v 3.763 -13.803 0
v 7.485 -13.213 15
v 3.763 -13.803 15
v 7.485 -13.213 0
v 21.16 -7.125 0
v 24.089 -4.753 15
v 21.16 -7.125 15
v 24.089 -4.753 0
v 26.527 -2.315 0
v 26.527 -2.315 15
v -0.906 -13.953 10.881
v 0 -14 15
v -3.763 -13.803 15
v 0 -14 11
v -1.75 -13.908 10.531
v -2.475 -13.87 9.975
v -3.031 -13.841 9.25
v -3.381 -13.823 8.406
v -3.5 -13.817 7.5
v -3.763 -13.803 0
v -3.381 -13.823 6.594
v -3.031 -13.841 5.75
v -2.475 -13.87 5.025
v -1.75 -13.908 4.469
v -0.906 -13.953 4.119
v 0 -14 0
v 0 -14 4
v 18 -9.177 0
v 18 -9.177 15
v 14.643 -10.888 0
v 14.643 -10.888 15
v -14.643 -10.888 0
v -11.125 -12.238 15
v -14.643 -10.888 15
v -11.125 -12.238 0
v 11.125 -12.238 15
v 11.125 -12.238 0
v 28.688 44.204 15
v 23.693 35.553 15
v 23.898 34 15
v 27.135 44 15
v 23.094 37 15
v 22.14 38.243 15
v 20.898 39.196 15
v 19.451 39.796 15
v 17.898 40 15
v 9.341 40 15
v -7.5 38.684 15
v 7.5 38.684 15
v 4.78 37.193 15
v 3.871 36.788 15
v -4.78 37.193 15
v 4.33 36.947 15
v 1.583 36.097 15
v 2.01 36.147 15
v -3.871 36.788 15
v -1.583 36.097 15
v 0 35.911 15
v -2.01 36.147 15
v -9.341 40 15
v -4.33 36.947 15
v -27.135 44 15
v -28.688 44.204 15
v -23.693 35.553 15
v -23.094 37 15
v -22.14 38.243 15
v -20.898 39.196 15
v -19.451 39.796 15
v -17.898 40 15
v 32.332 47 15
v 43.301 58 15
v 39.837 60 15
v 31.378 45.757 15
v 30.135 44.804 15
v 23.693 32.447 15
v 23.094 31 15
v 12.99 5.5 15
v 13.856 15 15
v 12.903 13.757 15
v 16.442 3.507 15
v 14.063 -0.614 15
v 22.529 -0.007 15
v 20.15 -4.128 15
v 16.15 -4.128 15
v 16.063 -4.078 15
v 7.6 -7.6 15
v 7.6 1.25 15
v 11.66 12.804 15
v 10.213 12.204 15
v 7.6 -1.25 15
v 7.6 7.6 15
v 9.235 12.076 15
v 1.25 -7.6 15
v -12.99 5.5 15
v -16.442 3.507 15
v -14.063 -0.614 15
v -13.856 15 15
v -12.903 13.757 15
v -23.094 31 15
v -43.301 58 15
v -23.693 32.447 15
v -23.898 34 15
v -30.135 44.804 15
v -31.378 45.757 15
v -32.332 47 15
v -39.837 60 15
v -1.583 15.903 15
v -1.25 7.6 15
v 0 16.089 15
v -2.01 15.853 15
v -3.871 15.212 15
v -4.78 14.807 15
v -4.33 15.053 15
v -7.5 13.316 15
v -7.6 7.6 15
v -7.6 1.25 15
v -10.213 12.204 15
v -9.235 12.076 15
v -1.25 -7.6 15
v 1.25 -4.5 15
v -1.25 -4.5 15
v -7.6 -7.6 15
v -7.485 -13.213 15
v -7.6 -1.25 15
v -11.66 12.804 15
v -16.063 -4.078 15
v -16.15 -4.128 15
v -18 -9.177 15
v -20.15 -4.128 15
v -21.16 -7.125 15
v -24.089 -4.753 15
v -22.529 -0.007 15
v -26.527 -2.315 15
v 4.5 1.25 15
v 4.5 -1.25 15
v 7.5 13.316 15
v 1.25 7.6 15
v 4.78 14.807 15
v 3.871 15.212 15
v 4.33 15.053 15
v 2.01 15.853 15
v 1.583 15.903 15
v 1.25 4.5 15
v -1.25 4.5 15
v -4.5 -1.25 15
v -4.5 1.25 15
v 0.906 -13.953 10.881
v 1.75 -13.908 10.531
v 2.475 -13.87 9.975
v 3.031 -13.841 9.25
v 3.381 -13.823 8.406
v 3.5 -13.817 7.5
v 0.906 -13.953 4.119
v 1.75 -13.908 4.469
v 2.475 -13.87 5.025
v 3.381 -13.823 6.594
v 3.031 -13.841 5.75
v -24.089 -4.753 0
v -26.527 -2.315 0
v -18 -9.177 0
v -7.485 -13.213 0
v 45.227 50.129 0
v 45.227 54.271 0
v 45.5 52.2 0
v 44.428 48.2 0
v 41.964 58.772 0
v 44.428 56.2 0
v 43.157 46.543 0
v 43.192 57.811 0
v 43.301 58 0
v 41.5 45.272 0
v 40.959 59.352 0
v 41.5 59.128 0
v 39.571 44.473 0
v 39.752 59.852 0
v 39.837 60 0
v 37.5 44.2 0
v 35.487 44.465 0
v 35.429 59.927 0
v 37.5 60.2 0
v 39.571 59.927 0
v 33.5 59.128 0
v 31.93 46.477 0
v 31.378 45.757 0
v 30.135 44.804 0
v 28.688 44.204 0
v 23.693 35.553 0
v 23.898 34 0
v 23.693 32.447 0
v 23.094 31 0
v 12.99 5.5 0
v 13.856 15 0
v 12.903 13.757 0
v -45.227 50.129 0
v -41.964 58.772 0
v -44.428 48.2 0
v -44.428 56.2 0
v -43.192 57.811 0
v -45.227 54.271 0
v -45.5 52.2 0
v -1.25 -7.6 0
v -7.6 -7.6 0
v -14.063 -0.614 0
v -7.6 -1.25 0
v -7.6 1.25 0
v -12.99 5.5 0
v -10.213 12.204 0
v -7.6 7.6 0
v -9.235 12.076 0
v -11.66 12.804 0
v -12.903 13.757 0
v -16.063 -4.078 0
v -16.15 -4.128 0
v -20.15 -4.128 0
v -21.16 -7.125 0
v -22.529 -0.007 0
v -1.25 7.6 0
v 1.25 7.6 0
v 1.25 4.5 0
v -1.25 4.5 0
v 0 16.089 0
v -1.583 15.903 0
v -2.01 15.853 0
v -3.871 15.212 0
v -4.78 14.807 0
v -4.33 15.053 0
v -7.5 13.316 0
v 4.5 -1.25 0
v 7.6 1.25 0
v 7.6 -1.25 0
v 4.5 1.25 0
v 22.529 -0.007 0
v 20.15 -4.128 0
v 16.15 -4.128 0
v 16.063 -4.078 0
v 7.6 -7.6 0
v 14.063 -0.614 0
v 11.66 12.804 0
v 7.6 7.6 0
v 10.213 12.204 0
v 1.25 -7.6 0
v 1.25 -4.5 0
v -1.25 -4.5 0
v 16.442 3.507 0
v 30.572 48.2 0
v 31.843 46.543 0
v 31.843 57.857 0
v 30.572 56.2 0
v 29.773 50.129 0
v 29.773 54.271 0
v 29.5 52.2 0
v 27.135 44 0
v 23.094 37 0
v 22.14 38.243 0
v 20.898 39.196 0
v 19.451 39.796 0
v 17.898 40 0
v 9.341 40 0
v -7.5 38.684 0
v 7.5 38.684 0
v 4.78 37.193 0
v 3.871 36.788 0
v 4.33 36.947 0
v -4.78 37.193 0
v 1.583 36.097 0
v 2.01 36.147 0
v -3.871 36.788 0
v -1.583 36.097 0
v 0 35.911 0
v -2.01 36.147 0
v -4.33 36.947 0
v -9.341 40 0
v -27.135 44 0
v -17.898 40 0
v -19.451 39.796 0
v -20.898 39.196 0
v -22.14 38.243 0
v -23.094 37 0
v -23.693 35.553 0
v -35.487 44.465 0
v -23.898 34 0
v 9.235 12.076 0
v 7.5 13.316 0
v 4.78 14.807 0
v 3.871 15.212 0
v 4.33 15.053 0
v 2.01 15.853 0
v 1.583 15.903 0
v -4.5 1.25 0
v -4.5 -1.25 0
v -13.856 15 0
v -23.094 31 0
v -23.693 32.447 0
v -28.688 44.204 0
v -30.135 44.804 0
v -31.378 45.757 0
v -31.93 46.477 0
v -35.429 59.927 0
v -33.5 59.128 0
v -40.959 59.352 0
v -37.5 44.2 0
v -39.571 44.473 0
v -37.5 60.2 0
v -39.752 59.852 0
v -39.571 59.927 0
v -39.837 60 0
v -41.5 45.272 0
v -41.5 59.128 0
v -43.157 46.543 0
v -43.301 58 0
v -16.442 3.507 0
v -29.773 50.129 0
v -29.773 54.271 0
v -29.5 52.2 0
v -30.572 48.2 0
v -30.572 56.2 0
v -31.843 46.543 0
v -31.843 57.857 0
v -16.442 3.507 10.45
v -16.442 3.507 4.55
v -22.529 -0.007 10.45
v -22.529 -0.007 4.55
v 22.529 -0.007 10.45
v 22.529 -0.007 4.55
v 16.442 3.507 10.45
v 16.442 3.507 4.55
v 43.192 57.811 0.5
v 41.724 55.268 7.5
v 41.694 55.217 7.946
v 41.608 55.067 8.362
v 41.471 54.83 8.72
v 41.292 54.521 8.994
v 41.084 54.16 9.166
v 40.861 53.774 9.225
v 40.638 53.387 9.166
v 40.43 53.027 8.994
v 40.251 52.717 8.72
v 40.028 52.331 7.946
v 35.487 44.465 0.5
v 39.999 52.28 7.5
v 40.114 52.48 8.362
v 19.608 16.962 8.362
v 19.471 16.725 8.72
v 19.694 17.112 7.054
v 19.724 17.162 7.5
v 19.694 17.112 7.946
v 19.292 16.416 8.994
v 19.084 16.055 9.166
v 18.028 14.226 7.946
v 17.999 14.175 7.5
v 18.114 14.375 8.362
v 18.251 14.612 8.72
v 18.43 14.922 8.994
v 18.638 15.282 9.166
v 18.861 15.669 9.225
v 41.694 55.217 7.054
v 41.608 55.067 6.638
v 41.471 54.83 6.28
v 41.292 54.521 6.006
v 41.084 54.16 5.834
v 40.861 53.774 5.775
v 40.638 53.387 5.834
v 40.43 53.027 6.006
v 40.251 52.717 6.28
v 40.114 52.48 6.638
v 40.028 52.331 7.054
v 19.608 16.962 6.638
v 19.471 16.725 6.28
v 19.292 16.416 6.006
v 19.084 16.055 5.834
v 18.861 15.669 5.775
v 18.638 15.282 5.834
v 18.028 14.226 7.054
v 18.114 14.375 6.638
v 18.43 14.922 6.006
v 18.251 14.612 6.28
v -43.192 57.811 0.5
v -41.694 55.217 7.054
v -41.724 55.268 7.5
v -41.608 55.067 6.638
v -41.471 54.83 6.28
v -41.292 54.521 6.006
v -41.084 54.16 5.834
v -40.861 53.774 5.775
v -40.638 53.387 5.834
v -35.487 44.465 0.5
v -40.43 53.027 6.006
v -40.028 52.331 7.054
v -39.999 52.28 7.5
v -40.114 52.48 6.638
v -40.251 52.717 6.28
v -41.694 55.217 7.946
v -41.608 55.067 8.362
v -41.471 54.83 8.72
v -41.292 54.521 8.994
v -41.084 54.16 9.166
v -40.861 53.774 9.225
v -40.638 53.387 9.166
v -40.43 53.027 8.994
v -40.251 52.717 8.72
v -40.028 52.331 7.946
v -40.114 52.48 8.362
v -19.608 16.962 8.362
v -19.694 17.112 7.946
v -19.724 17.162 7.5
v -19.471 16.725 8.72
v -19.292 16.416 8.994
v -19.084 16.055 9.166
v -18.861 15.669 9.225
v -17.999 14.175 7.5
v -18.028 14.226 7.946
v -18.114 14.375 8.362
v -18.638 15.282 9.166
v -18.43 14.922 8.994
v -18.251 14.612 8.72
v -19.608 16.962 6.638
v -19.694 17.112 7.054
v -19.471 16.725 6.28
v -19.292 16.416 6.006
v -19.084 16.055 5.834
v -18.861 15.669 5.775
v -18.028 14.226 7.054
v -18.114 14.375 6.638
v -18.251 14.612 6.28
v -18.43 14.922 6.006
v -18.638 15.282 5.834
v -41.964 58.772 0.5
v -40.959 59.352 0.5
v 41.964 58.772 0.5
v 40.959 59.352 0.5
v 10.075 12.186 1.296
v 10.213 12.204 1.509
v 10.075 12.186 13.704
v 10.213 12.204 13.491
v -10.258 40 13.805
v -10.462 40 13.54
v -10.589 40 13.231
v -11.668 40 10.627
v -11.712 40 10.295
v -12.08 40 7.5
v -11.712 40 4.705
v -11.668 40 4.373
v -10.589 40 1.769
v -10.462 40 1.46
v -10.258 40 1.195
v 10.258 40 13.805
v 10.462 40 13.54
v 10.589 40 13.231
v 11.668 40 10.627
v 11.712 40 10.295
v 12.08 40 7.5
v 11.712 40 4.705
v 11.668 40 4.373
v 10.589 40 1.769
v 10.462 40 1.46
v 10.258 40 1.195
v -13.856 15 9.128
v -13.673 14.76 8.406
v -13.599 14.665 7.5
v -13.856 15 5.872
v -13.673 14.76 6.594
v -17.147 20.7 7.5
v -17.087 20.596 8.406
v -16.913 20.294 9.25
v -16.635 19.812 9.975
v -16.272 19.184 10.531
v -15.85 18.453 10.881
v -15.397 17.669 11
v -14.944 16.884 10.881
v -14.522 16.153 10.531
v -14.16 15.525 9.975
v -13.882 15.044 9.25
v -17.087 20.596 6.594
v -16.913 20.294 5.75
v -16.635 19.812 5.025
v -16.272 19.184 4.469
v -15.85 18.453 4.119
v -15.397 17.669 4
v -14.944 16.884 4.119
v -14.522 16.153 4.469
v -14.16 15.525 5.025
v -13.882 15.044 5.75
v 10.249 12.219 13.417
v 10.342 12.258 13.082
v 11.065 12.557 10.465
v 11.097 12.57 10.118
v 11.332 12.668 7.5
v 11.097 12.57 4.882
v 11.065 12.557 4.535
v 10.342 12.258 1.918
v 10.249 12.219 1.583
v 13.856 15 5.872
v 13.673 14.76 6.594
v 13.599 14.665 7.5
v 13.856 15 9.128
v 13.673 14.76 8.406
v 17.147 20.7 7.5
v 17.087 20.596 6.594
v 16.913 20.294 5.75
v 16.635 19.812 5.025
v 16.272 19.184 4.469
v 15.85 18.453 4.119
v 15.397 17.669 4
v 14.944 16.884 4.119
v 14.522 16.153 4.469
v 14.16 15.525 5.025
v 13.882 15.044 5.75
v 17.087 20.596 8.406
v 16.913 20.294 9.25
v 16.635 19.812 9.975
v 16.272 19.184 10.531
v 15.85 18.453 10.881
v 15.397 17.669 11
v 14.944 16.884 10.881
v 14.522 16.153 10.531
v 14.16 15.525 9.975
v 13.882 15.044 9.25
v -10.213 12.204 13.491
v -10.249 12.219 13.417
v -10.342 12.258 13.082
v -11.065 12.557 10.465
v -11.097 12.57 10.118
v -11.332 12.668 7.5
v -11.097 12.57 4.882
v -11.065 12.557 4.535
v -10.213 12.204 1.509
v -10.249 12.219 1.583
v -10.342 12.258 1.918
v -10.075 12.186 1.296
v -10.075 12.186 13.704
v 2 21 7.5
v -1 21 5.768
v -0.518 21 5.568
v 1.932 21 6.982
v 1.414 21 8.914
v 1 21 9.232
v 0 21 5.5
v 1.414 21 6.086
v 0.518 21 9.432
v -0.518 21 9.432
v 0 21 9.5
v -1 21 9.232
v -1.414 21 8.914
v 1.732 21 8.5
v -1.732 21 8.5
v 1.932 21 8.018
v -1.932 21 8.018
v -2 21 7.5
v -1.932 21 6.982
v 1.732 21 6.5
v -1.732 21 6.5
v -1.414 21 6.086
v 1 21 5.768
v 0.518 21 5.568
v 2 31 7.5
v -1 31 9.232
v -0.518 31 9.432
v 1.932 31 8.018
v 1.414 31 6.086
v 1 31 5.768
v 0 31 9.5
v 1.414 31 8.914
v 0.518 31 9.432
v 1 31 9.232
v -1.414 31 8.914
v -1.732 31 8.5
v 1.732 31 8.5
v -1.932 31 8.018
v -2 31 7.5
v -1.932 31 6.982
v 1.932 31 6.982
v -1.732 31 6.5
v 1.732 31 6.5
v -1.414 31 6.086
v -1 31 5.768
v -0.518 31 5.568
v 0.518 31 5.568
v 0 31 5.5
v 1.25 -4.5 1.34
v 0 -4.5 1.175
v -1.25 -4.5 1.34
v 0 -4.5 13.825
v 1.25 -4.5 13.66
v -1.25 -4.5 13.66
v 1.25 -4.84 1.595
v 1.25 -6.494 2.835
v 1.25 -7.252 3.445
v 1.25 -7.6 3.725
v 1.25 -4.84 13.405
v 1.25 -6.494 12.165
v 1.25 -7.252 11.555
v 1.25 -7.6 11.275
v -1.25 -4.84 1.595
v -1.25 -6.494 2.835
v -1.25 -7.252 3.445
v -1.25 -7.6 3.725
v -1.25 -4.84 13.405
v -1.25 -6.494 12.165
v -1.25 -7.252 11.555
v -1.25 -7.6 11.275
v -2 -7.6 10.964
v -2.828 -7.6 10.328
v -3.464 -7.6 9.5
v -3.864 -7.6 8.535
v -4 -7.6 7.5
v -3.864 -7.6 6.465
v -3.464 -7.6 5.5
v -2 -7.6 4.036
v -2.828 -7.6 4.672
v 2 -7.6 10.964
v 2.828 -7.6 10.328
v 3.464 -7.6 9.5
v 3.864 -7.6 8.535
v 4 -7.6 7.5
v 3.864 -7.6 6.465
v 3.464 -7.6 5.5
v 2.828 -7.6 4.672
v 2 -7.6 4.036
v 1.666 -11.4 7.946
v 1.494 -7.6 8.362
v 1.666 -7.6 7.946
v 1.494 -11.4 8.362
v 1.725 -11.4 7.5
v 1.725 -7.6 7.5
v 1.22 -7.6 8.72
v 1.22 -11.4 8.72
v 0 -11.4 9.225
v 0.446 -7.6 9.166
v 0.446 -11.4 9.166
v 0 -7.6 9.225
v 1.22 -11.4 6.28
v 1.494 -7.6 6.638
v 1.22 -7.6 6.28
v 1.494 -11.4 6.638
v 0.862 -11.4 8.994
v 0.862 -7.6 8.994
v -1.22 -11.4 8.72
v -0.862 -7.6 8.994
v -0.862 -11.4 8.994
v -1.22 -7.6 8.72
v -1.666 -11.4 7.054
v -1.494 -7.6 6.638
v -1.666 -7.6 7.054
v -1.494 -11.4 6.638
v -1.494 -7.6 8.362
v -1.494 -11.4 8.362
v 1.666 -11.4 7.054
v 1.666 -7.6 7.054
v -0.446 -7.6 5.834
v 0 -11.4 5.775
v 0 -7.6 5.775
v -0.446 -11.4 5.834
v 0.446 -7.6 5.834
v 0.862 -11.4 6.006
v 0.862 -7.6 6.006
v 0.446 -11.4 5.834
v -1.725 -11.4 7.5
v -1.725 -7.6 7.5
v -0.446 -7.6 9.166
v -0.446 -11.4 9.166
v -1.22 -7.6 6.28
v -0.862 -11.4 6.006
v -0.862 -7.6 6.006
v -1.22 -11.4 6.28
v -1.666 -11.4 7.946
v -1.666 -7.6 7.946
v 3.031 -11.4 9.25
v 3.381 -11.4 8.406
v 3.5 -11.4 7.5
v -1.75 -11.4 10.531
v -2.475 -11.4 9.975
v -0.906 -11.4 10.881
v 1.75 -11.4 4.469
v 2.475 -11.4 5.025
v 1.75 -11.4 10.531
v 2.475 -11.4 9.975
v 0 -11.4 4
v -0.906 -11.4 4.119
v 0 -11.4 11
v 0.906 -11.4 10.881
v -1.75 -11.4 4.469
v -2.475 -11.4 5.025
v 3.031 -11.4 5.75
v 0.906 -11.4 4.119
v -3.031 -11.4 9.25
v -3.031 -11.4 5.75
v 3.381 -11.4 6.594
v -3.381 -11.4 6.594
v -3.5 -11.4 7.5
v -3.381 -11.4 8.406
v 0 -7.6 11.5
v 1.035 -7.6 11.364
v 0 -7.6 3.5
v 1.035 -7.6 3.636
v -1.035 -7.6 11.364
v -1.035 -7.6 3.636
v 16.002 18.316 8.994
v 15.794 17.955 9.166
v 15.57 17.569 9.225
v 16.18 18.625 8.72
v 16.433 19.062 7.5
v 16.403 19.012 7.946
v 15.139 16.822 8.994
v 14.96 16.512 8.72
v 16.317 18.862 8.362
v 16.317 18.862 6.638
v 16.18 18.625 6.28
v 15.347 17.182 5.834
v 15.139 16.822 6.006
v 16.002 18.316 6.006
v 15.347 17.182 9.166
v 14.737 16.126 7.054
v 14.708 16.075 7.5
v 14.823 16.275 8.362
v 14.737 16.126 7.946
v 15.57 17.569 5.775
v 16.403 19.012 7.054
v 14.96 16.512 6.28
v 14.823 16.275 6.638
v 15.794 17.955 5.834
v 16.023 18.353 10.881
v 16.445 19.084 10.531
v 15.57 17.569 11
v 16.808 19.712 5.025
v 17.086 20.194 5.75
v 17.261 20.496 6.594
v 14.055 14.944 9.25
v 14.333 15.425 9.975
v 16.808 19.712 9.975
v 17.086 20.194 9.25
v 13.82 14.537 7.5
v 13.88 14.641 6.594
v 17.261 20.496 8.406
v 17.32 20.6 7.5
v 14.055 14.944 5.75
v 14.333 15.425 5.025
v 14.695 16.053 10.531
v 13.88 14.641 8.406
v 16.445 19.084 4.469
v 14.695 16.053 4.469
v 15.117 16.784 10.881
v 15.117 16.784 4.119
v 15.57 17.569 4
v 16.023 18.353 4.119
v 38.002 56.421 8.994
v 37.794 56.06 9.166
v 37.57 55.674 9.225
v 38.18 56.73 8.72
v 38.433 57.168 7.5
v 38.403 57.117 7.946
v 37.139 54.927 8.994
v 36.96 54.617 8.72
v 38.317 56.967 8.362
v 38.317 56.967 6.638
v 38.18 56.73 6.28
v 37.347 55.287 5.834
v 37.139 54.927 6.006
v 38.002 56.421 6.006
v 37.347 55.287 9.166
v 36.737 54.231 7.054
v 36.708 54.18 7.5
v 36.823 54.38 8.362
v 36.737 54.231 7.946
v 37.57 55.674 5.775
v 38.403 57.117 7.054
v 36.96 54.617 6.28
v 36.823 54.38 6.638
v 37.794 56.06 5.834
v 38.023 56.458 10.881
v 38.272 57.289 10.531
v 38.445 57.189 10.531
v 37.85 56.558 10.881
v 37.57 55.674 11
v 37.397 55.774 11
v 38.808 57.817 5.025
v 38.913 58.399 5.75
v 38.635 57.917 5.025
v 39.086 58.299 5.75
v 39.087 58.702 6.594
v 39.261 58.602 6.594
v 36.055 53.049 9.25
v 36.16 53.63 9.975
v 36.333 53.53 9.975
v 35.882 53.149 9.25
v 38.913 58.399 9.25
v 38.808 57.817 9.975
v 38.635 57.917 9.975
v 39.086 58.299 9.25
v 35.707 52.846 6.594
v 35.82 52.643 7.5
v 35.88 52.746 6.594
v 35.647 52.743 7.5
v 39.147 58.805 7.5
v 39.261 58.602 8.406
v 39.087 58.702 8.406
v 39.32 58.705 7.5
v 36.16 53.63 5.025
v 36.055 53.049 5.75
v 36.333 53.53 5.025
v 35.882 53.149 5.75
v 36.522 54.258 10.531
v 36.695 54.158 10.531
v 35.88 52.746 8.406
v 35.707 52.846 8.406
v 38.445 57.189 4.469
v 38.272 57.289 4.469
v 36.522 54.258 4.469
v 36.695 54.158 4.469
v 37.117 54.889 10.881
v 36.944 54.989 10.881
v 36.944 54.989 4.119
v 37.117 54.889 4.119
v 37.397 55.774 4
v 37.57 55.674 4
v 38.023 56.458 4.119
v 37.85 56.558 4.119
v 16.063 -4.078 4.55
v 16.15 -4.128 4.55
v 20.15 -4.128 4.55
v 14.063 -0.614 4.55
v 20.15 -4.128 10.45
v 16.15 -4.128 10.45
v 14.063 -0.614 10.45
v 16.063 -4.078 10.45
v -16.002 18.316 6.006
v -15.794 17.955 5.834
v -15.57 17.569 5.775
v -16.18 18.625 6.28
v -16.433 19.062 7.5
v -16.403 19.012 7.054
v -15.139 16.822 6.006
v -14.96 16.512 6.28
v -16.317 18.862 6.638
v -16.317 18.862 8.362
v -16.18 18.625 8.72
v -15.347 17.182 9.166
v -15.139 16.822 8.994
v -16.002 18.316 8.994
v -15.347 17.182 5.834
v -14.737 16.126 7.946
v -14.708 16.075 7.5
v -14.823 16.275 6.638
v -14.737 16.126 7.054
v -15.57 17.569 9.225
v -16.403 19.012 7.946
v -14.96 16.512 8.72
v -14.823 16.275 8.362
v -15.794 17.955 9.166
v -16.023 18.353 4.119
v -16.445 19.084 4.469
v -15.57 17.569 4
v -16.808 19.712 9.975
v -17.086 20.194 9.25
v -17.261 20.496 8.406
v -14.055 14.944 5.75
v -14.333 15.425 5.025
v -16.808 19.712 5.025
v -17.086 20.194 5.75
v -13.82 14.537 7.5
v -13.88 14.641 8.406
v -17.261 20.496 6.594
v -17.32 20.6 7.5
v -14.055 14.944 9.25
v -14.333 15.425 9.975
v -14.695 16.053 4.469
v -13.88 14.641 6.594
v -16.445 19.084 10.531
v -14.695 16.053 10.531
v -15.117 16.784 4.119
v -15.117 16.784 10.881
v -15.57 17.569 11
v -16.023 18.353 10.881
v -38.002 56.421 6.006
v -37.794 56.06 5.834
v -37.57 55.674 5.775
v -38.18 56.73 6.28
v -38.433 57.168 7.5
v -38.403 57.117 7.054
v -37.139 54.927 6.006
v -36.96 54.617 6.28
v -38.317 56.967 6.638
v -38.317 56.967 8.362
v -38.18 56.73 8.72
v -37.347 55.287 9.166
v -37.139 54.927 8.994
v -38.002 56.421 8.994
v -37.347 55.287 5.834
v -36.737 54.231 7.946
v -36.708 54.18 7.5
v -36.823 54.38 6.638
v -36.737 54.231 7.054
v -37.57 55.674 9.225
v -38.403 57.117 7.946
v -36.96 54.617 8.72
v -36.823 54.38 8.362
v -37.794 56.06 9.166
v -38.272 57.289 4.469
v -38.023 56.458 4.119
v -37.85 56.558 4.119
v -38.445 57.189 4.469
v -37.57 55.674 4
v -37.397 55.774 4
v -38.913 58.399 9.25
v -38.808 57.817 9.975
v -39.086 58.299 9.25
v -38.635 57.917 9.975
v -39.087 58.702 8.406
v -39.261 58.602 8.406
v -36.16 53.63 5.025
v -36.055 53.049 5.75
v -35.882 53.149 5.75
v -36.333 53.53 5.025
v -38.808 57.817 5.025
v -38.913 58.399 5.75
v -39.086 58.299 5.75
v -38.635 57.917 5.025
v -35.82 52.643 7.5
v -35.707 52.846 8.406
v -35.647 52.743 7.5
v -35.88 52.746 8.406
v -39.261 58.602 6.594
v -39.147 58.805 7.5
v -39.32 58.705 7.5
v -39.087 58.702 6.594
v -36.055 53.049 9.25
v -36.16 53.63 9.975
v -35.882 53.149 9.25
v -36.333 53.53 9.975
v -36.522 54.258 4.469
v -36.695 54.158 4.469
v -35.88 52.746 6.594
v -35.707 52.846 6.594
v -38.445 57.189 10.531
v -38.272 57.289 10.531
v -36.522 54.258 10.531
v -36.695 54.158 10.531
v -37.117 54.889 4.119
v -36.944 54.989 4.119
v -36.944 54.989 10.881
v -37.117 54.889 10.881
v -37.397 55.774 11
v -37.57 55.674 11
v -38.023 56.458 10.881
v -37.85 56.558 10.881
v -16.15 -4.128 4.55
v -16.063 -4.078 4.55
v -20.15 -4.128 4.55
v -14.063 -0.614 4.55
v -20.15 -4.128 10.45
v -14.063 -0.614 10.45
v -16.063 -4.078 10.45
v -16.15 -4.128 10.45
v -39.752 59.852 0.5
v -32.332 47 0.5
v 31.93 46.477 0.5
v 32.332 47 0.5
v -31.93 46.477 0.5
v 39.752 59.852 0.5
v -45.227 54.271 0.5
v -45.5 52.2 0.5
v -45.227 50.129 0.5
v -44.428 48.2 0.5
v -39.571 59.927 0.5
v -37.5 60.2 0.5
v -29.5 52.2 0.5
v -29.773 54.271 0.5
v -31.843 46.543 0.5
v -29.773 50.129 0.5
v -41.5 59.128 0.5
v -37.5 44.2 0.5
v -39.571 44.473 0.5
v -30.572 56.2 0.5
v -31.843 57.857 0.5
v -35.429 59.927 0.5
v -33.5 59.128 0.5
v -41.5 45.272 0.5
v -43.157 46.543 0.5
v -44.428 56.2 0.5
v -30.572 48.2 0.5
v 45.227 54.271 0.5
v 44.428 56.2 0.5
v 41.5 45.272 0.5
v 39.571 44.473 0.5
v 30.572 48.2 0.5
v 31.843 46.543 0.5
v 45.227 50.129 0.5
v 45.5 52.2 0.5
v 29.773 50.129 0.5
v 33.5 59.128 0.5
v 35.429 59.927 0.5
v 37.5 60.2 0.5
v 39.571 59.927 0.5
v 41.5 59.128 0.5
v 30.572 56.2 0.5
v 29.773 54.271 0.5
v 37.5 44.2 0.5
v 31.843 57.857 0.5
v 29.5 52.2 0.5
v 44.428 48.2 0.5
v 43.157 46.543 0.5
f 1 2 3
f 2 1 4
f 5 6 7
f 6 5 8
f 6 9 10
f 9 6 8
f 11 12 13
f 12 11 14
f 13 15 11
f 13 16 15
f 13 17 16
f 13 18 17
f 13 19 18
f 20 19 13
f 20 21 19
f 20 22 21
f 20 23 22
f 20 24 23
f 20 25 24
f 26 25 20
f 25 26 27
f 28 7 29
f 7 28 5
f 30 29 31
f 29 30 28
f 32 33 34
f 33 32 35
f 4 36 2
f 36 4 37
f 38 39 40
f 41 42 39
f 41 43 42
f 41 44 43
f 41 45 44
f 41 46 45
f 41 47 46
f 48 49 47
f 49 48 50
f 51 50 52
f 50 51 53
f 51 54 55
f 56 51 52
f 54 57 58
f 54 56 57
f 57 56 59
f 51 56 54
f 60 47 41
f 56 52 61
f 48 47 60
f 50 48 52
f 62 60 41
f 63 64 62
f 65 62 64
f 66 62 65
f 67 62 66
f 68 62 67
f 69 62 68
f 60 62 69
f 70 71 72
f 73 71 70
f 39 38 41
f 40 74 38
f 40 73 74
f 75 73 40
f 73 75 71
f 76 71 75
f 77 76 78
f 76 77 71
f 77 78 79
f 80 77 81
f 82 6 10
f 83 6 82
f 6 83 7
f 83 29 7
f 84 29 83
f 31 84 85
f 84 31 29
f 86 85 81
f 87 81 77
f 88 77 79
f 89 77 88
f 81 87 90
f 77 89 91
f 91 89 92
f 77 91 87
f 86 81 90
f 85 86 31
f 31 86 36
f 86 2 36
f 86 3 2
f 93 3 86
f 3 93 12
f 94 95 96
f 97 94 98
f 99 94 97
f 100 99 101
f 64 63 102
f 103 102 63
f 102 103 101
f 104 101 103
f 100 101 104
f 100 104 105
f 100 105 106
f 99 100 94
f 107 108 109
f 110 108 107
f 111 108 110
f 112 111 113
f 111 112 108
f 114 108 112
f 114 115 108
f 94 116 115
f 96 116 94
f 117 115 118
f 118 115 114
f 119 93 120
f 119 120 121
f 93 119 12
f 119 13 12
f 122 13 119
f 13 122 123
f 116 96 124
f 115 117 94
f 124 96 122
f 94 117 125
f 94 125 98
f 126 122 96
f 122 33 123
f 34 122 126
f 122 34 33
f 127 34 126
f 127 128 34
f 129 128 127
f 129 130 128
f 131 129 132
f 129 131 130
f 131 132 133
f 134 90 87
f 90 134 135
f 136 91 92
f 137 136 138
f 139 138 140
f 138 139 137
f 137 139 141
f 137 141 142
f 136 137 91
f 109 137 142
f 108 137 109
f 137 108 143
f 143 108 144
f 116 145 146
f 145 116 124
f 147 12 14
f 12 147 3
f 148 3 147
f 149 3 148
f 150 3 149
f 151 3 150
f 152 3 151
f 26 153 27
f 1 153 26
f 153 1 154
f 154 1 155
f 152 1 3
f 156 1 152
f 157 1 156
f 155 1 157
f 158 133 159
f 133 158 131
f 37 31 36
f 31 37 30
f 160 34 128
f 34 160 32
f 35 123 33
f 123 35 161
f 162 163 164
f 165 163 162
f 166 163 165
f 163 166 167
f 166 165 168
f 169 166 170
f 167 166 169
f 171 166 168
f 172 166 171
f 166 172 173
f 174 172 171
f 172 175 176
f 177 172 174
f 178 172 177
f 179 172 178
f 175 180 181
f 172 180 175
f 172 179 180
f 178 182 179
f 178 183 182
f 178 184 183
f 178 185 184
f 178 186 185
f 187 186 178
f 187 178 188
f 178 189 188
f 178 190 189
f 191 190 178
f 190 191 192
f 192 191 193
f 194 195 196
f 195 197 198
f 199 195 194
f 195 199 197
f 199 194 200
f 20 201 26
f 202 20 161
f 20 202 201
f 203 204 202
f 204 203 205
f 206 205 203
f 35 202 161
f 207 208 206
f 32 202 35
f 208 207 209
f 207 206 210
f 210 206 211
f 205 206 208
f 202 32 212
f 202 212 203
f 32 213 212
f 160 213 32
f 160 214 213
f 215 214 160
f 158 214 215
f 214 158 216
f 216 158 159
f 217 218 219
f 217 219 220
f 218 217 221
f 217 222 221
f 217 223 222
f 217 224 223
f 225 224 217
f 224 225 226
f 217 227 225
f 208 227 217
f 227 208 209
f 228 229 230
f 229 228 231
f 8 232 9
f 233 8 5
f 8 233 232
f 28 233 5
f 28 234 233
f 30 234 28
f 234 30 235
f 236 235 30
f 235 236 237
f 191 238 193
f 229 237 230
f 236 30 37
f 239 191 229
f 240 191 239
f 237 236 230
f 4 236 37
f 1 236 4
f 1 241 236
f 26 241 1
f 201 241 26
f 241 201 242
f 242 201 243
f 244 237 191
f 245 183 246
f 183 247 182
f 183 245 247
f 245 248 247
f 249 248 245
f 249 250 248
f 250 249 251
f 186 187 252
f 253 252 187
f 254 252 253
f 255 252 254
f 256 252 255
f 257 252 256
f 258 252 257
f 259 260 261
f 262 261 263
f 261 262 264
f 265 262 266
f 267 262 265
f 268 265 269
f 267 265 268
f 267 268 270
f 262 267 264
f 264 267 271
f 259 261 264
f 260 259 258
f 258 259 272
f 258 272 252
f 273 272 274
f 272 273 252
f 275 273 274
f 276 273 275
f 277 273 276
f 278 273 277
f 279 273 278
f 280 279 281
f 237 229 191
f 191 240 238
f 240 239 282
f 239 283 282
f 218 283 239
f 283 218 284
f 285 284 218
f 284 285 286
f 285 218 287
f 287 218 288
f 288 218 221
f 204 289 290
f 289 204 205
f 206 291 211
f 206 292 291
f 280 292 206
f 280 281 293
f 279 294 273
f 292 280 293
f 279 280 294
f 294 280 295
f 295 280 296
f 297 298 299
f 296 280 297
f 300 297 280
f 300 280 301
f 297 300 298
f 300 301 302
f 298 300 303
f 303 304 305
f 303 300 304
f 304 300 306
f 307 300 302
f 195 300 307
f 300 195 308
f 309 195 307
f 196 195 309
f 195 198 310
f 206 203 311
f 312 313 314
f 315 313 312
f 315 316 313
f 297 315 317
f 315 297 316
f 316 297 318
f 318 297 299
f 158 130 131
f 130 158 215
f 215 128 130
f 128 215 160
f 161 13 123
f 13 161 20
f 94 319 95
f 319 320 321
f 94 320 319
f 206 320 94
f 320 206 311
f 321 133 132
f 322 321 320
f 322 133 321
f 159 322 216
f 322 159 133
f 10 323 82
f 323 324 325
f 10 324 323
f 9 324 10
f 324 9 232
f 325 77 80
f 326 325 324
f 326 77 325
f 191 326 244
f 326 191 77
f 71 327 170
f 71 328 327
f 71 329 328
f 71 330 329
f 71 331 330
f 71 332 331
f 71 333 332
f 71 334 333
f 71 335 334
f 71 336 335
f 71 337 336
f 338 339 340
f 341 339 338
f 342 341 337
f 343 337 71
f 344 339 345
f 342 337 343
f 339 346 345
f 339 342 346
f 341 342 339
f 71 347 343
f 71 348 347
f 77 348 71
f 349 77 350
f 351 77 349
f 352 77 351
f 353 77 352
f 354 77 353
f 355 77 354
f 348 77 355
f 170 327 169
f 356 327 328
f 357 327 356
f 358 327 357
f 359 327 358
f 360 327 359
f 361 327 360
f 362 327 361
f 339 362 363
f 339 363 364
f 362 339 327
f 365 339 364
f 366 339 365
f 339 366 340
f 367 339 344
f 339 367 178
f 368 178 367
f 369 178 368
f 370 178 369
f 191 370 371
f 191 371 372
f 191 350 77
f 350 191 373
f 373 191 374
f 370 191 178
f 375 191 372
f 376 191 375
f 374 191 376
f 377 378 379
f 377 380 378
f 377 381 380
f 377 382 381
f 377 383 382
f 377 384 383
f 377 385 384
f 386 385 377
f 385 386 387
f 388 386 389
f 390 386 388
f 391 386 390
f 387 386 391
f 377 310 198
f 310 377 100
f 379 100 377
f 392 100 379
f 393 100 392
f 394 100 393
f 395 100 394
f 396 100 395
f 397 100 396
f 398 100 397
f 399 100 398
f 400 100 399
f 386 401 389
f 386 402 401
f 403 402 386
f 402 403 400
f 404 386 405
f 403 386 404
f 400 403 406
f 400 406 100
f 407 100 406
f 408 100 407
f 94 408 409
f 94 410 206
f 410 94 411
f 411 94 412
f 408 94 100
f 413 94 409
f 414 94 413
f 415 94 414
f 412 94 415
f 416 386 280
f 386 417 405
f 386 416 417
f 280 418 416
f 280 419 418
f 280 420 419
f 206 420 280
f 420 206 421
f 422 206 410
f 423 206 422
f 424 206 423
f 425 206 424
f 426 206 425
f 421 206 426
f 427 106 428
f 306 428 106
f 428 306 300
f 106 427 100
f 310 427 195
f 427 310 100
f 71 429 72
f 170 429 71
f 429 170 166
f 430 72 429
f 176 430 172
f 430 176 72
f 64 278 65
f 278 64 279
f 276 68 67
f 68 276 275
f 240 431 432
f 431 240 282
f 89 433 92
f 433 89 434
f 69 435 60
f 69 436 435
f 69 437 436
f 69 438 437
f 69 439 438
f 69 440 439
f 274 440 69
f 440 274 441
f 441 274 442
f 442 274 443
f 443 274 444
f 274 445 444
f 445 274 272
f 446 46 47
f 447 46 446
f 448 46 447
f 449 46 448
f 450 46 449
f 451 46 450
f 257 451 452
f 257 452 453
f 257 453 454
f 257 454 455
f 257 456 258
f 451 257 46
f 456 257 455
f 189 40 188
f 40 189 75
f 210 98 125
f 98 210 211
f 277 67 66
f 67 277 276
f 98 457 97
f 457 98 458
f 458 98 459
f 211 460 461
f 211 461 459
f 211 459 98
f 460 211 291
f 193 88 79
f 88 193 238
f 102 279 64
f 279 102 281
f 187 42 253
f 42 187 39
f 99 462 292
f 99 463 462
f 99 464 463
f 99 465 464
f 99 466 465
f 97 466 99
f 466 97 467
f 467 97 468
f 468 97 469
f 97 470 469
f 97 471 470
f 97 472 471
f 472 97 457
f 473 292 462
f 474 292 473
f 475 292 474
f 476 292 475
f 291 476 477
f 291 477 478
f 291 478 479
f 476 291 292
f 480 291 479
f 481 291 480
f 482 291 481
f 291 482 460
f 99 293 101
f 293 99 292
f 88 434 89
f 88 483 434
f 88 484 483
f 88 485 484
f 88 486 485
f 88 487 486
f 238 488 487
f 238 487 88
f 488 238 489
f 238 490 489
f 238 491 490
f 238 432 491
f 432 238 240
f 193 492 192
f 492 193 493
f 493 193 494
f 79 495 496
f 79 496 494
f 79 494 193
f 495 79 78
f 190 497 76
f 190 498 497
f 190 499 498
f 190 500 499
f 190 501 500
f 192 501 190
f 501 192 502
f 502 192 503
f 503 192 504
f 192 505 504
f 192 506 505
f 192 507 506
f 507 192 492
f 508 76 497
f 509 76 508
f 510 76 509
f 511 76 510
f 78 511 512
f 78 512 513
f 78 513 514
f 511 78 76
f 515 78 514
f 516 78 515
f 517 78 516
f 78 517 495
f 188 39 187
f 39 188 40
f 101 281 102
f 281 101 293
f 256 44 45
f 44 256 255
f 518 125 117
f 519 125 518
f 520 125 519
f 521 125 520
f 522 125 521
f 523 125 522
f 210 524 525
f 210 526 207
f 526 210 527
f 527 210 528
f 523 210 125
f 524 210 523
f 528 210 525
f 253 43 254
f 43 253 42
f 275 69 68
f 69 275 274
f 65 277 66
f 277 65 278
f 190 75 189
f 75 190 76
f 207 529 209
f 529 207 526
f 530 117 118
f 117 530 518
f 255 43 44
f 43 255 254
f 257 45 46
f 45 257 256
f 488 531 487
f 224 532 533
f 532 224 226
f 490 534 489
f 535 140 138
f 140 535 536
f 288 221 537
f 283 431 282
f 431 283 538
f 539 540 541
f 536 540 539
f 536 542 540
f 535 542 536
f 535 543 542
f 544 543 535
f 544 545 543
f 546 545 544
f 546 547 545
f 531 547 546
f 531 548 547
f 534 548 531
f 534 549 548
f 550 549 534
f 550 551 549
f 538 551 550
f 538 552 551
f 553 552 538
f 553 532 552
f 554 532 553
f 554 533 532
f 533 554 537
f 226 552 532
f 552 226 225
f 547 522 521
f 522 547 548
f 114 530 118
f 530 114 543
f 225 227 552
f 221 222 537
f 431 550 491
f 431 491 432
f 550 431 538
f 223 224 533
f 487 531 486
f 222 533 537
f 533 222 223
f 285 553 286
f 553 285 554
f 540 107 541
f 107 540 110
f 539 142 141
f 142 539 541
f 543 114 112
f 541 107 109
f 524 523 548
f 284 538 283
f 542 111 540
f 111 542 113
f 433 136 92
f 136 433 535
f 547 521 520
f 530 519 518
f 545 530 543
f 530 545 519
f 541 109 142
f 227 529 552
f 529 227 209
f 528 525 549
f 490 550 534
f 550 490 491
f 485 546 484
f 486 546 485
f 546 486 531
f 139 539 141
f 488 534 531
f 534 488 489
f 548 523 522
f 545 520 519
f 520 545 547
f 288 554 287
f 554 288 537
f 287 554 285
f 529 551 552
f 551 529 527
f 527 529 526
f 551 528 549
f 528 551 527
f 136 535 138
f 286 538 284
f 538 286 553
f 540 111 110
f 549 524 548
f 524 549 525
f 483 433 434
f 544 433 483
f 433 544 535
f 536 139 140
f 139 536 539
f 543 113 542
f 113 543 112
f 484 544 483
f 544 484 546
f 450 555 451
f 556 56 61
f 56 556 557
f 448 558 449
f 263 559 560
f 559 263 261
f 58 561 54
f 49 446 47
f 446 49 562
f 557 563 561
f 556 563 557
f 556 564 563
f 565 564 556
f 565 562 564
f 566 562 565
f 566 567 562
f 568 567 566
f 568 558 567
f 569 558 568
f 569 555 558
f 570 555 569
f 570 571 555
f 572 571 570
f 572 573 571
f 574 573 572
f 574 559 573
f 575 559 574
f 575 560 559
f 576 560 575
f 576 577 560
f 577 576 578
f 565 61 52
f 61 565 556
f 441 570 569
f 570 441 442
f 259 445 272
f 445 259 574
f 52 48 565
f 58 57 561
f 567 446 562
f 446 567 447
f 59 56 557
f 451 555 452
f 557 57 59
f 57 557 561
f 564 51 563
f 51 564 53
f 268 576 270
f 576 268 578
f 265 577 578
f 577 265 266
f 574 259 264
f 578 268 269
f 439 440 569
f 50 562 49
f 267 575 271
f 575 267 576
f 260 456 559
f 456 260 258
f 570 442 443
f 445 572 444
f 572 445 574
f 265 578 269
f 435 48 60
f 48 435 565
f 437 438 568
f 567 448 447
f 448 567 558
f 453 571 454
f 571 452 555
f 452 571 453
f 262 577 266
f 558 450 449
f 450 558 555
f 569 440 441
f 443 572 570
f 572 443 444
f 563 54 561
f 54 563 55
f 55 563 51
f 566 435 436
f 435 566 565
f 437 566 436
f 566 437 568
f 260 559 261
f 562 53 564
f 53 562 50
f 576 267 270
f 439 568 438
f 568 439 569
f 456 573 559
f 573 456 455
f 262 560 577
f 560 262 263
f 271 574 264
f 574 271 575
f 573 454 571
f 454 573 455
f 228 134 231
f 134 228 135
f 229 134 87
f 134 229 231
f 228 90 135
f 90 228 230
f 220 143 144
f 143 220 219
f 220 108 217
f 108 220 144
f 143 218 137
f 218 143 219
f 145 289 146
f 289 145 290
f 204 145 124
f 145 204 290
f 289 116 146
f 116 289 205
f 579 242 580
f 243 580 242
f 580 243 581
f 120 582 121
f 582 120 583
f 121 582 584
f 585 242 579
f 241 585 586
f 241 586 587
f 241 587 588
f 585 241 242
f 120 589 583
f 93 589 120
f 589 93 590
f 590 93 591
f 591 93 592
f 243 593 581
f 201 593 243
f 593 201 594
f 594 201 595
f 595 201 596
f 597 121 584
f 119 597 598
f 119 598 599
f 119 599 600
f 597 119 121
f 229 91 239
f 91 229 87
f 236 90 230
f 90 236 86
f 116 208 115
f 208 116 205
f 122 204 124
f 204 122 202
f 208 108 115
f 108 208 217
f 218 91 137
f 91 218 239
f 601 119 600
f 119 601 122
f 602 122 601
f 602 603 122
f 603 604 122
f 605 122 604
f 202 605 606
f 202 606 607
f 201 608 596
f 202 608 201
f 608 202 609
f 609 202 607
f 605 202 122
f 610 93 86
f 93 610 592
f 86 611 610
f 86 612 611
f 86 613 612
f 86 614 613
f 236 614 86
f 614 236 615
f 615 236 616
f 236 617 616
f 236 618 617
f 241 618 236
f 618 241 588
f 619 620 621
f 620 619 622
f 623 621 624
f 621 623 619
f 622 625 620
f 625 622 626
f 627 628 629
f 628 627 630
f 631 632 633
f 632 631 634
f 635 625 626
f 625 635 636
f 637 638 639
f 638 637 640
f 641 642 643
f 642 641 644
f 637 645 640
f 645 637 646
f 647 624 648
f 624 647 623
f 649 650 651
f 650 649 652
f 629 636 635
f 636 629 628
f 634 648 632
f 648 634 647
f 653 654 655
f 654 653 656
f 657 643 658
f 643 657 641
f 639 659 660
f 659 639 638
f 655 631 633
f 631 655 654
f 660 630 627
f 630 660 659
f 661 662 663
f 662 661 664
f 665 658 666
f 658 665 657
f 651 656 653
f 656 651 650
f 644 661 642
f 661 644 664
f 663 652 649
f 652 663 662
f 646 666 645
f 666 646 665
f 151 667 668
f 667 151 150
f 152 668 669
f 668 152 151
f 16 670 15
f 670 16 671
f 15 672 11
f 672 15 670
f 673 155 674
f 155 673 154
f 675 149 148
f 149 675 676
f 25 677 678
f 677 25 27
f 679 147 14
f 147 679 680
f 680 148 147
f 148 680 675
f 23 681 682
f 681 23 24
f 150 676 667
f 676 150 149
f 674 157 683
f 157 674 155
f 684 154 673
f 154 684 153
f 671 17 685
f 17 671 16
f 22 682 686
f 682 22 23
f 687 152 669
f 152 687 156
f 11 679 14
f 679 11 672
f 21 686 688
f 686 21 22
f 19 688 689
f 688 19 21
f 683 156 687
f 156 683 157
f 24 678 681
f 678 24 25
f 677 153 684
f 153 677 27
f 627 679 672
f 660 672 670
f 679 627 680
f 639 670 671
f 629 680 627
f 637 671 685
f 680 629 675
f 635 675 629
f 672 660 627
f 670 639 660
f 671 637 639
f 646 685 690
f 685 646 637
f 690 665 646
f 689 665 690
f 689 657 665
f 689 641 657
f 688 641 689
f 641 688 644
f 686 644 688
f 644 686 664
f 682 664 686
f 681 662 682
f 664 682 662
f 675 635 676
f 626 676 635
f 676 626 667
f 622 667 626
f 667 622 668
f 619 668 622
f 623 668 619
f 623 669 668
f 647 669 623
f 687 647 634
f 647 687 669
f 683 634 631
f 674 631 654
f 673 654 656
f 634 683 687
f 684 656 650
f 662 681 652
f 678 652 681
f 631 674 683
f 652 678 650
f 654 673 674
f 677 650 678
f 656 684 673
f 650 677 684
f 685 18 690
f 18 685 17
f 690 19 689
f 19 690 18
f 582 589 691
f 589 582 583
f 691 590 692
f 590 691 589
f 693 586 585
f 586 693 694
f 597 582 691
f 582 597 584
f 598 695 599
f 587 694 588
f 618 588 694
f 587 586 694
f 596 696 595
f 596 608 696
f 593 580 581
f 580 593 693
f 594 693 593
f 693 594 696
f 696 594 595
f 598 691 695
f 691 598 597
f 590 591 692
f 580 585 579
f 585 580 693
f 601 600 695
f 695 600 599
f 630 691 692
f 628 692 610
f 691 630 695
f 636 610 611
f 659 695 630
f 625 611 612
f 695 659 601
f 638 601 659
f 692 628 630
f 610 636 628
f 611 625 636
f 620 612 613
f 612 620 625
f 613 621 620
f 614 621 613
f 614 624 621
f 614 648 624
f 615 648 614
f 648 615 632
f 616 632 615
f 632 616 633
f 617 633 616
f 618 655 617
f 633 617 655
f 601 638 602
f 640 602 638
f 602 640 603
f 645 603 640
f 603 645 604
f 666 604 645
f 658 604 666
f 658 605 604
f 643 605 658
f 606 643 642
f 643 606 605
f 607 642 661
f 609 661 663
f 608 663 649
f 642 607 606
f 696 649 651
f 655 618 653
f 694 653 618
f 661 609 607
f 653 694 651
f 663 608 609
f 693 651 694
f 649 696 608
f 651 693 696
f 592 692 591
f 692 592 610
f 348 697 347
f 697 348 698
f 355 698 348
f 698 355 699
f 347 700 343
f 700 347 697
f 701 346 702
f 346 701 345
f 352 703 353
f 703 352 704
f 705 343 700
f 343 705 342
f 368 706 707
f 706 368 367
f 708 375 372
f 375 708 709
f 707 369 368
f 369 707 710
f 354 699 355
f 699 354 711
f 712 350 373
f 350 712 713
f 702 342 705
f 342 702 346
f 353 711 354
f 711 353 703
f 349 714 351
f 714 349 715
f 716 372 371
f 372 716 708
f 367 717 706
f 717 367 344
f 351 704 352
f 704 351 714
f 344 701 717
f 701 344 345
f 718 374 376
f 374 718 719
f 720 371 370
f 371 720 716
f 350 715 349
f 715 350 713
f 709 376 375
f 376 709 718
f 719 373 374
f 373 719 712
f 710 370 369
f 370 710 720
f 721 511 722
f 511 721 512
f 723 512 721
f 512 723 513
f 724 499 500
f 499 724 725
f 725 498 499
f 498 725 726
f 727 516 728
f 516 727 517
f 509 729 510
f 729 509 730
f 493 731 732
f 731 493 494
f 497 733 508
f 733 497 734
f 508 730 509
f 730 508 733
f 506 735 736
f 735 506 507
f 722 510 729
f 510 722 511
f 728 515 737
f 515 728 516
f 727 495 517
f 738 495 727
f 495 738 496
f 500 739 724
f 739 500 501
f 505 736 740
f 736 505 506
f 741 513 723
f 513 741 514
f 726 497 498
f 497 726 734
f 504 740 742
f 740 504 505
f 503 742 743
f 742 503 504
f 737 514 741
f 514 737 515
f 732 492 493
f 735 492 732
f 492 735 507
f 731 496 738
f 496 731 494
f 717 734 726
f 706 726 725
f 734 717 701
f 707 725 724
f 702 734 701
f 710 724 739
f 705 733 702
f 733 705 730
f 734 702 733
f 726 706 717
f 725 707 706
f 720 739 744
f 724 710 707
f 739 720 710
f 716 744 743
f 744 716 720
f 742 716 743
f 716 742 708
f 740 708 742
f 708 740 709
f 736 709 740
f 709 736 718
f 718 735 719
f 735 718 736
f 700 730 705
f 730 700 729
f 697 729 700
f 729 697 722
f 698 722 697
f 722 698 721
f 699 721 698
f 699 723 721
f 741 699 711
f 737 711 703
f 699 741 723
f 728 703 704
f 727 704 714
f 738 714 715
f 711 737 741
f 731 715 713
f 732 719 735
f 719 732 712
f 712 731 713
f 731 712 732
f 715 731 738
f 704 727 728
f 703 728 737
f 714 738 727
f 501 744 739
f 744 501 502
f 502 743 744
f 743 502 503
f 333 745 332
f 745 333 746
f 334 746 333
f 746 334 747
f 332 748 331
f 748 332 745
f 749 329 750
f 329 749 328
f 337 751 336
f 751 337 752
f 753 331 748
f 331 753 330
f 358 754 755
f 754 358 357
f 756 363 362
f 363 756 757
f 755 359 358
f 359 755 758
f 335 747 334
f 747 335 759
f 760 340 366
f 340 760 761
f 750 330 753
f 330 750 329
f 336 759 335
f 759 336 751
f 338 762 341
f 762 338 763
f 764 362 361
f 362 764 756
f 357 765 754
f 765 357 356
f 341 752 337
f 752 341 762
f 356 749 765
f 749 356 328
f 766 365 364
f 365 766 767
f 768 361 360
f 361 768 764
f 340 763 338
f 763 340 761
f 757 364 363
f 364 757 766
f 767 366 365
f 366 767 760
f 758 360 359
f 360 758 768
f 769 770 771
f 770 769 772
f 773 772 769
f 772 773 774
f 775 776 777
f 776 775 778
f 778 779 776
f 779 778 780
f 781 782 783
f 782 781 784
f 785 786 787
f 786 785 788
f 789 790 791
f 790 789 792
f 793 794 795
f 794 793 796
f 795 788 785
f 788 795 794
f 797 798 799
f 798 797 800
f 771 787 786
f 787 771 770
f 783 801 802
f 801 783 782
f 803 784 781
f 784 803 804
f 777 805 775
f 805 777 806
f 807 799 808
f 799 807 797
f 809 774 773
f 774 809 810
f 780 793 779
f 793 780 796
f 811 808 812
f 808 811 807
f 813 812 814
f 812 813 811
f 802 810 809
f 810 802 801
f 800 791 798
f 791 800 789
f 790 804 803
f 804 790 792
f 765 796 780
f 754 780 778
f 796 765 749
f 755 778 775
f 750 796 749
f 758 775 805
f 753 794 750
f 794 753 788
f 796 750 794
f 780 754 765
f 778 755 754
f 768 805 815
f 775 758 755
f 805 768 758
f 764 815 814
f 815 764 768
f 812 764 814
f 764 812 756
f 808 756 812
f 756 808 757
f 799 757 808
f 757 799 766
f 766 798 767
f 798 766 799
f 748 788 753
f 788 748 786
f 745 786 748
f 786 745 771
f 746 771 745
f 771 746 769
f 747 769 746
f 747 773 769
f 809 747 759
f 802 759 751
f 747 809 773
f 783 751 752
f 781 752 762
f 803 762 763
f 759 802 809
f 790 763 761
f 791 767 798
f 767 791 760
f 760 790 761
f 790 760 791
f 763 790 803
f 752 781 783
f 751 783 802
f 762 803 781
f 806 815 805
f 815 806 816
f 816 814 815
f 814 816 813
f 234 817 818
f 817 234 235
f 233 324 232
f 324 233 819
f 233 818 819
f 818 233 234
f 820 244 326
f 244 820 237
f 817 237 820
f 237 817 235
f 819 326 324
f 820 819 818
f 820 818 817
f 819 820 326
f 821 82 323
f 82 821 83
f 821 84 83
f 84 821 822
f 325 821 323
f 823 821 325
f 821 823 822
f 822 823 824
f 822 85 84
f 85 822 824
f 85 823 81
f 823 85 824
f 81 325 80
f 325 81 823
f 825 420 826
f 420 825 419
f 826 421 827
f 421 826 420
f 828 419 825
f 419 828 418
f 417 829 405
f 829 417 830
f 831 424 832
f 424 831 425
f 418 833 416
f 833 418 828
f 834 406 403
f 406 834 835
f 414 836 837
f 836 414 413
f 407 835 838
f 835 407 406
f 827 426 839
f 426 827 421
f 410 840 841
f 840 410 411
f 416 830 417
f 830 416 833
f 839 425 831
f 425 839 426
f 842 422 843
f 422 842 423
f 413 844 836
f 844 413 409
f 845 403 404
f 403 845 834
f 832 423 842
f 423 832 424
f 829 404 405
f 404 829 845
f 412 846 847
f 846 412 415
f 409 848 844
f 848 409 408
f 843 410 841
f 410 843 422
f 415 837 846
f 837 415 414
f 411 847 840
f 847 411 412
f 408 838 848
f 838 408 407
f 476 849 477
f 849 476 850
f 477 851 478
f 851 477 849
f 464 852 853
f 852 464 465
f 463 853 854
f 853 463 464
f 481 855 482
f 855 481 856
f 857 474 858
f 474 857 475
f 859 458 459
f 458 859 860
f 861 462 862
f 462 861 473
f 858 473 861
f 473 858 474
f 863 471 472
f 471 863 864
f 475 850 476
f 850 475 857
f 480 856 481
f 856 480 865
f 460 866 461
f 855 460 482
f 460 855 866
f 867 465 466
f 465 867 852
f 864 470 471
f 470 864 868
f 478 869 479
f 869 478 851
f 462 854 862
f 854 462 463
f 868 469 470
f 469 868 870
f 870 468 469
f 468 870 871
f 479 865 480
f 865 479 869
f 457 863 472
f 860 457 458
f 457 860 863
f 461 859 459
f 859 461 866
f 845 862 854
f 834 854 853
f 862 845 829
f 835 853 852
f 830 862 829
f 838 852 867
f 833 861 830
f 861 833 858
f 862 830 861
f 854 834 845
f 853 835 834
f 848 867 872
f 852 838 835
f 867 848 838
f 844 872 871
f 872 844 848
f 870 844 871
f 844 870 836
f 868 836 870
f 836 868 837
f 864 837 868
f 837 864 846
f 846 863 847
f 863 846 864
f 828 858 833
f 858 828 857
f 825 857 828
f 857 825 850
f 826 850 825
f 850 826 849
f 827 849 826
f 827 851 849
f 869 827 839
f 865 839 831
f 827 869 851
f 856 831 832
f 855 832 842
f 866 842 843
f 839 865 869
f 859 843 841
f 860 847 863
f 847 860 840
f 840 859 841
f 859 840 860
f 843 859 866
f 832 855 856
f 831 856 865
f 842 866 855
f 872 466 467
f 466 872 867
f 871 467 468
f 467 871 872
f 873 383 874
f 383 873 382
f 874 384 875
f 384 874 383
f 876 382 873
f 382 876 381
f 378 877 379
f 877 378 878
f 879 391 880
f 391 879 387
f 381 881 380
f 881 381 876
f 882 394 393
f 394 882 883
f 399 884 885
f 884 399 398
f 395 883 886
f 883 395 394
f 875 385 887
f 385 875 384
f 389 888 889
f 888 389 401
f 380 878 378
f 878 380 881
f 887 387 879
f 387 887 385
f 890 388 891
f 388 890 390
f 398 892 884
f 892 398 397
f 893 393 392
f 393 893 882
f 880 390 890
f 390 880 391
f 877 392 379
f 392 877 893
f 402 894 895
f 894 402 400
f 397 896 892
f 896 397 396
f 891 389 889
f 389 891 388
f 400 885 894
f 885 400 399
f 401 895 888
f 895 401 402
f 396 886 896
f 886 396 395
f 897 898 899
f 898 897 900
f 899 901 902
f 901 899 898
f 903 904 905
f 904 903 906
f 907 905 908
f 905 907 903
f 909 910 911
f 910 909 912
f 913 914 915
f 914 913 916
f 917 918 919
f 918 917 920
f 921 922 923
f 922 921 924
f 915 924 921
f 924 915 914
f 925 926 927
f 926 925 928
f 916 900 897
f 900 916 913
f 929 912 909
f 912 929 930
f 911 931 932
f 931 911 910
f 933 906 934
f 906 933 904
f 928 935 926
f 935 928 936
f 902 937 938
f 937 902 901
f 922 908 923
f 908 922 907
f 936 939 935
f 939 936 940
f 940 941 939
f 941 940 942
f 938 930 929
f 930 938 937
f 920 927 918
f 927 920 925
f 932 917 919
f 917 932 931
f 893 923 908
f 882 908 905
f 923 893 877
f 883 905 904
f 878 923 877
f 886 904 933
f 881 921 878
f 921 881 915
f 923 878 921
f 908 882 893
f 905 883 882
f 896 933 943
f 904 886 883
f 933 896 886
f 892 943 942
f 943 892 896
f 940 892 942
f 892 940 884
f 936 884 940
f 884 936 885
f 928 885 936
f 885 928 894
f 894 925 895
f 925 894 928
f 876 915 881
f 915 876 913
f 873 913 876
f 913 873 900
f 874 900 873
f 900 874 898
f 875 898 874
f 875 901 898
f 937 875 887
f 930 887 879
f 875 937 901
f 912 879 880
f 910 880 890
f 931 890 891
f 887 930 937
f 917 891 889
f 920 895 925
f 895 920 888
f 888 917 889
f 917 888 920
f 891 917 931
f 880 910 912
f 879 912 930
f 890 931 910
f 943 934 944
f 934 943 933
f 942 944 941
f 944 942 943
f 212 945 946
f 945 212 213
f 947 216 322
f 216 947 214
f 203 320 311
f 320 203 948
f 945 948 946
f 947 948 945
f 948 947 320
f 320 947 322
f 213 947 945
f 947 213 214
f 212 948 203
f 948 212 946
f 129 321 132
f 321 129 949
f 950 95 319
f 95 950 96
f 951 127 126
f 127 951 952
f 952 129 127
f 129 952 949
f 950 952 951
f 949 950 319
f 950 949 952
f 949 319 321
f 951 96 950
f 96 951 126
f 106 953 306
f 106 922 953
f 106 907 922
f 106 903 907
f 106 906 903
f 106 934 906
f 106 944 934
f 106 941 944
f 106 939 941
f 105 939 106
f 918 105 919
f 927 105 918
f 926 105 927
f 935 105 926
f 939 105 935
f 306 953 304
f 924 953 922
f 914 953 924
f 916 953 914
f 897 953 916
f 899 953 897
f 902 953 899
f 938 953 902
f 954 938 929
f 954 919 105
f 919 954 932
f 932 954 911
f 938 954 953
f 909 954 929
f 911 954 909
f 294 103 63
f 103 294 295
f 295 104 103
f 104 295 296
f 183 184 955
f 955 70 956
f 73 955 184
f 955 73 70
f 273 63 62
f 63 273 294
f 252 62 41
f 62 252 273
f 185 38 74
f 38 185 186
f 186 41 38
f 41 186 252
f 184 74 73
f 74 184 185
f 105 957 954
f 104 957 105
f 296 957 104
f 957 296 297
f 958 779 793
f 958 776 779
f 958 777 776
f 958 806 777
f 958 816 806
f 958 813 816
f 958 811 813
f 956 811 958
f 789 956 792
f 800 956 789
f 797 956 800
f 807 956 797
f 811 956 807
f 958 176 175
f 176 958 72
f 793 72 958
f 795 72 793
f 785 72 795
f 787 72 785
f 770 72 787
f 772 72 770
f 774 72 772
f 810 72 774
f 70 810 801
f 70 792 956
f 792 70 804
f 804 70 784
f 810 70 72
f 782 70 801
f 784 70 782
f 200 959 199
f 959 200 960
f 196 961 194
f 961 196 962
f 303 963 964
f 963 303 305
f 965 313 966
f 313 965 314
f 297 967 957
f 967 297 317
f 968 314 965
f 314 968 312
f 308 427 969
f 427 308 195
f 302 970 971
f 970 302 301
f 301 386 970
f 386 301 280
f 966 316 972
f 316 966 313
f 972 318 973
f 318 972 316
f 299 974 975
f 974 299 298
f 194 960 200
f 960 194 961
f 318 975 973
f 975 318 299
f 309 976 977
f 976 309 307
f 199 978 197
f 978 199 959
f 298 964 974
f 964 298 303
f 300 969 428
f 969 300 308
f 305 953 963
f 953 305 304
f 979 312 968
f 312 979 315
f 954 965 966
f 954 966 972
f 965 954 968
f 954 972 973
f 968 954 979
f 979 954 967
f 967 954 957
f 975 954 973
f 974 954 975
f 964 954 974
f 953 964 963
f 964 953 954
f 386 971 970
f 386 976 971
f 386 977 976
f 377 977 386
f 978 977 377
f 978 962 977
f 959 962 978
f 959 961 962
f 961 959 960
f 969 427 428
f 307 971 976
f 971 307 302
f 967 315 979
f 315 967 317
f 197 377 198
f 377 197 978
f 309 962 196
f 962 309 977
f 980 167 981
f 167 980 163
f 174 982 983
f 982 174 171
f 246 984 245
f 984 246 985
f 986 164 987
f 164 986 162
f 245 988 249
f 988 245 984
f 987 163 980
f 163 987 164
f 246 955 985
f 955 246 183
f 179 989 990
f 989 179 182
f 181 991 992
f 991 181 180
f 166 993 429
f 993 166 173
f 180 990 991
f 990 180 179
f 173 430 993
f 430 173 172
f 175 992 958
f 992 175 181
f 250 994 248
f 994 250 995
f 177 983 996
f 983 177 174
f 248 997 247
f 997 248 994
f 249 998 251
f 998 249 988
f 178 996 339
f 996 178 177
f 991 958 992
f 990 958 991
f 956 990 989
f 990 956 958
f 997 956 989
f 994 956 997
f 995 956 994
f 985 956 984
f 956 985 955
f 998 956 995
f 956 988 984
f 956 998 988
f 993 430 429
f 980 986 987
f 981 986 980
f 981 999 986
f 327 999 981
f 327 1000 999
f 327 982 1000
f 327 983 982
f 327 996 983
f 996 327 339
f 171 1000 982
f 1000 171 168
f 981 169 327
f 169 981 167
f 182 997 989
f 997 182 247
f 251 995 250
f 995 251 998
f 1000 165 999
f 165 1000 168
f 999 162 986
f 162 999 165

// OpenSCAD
// file: configuration.scad
// Increase this if your slicer or printer make holes too tight.
extra_radius = 0.1;

// OD = outside diameter, corner to corner.
m3_nut_od = 6.1;
m3_nut_radius = m3_nut_od/2 + 0.2 + extra_radius;
m3_washer_radius = 3.5 + extra_radius;

// Major diameter of metric 3mm thread.
m3_major = 2.85;
m3_radius = m3_major/2 + extra_radius;
m3_wide_radius = m3_major/2 + extra_radius + 0.2;

// NEMA17 stepper motors.
motor_shaft_diameter = 5;
motor_shaft_radius = motor_shaft_diameter/2 + extra_radius;

// Frame brackets. M3x8mm screws work best with 3.6 mm brackets.
thickness = 3.6;

// OpenBeam or Misumi. Currently only 15x15 mm, but there is a plan
// to make models more parametric and allow 20x20 mm in the future.
extrusion = 15;

// Placement for the NEMA17 stepper motors.
motor_offset = 44;
motor_length = 47;
// main file
include <configuration.scad>;

$fn = 24;
roundness = 6;

module extrusion_cutout(h, extra) {
  difference() {
    cube([extrusion+extra, extrusion+extra, h], center=true);
    for (a = [0:90:359]) rotate([0, 0, a]) {
      translate([extrusion/2, 0, 0])
        cube([6, 2.5, h+1], center=true);
    }
  }
}

module screw_socket() {
  cylinder(r=m3_wide_radius, h=20, center=true);
  translate([0, 0, 3.8]) cylinder(r=3.5, h=5);
}

module screw_socket_cone() {
  union() {
    screw_socket();
    scale([1, 1, -1]) cylinder(r1=4, r2=7, h=4);
  }
}

module vertex(height, idler_offset, idler_space) {
  union() {
    // Pads to improve print bed adhesion for slim ends.
    translate([-37.5, 52.2, -height/2]) cylinder(r=8, h=0.5);
    translate([37.5, 52.2, -height/2]) cylinder(r=8, h=0.5);
    difference() {
      union() {
        intersection() {
          translate([0, 22, 0])
            cylinder(r=36, h=height, center=true, $fn=60);
          translate([0, -37, 0]) rotate([0, 0, 30])
            cylinder(r=50, h=height+1, center=true, $fn=6);
        }
        translate([0, 38, 0]) intersection() {
          rotate([0, 0, -90])
            cylinder(r=55, h=height, center=true, $fn=3);
          translate([0, 10, 0])
            cube([100, 100, 2*height], center=true);
          translate([0, -10, 0]) rotate([0, 0, 30])
            cylinder(r=55, h=height+1, center=true, $fn=6);
        }
      }
      difference() {
        translate([0, 58, 0]) minkowski() {
          intersection() {
            rotate([0, 0, -90])
              cylinder(r=55, h=height, center=true, $fn=3);
            translate([0, -32, 0])
              cube([100, 16, 2*height], center=true);
          }
          cylinder(r=roundness, h=1, center=true);
        }
        // Idler support cones.
        translate([0, 26+idler_offset-30, 0]) rotate([-90, 0, 0])
          cylinder(r1=30, r2=2, h=30-idler_space/2);
        translate([0, 26+idler_offset+30, 0]) rotate([90, 0, 0])
          cylinder(r1=30, r2=2, h=30-idler_space/2);
      }
      translate([0, 58, 0]) minkowski() {
        intersection() {
          rotate([0, 0, -90])
            cylinder(r=55, h=height, center=true, $fn=3);
          translate([0, 7, 0])
            cube([100, 30, 2*height], center=true);
        }
        cylinder(r=roundness, h=1, center=true);
      }
      extrusion_cutout(height+10, 2*extra_radius);
      for (z = [0:30:height]) {
        translate([0, -7.5-extra_radius, z+7.5-height/2]) rotate([90, 0, 0])
          screw_socket_cone();
        for (a = [-1, 1]) {
          rotate([0, 0, 30*a]) translate([-16*a, 111, z+7.5-height/2]) {
            // % rotate([90, 0, 0]) extrusion_cutout(200, 0);
            // Screw sockets.
            for (y = [-88, -44]) {
              translate([a*7.5, y, 0]) rotate([0, a*90, 0]) screw_socket();
            }
            // Nut tunnels.
	    for (z = [-1, 1]) {
	      scale([1, 1, z]) translate([0, -100, 3]) minkowski() {
	        rotate([0, 0, -a*30]) cylinder(r=4, h=16, $fn=6);
		cube([0.1, 5, 0.1], center=true);
	      }
            }
          }
        }
      }
    }
  }
}

translate([0, 0, 7.5]) vertex(15, idler_offset=0, idler_space=10);
